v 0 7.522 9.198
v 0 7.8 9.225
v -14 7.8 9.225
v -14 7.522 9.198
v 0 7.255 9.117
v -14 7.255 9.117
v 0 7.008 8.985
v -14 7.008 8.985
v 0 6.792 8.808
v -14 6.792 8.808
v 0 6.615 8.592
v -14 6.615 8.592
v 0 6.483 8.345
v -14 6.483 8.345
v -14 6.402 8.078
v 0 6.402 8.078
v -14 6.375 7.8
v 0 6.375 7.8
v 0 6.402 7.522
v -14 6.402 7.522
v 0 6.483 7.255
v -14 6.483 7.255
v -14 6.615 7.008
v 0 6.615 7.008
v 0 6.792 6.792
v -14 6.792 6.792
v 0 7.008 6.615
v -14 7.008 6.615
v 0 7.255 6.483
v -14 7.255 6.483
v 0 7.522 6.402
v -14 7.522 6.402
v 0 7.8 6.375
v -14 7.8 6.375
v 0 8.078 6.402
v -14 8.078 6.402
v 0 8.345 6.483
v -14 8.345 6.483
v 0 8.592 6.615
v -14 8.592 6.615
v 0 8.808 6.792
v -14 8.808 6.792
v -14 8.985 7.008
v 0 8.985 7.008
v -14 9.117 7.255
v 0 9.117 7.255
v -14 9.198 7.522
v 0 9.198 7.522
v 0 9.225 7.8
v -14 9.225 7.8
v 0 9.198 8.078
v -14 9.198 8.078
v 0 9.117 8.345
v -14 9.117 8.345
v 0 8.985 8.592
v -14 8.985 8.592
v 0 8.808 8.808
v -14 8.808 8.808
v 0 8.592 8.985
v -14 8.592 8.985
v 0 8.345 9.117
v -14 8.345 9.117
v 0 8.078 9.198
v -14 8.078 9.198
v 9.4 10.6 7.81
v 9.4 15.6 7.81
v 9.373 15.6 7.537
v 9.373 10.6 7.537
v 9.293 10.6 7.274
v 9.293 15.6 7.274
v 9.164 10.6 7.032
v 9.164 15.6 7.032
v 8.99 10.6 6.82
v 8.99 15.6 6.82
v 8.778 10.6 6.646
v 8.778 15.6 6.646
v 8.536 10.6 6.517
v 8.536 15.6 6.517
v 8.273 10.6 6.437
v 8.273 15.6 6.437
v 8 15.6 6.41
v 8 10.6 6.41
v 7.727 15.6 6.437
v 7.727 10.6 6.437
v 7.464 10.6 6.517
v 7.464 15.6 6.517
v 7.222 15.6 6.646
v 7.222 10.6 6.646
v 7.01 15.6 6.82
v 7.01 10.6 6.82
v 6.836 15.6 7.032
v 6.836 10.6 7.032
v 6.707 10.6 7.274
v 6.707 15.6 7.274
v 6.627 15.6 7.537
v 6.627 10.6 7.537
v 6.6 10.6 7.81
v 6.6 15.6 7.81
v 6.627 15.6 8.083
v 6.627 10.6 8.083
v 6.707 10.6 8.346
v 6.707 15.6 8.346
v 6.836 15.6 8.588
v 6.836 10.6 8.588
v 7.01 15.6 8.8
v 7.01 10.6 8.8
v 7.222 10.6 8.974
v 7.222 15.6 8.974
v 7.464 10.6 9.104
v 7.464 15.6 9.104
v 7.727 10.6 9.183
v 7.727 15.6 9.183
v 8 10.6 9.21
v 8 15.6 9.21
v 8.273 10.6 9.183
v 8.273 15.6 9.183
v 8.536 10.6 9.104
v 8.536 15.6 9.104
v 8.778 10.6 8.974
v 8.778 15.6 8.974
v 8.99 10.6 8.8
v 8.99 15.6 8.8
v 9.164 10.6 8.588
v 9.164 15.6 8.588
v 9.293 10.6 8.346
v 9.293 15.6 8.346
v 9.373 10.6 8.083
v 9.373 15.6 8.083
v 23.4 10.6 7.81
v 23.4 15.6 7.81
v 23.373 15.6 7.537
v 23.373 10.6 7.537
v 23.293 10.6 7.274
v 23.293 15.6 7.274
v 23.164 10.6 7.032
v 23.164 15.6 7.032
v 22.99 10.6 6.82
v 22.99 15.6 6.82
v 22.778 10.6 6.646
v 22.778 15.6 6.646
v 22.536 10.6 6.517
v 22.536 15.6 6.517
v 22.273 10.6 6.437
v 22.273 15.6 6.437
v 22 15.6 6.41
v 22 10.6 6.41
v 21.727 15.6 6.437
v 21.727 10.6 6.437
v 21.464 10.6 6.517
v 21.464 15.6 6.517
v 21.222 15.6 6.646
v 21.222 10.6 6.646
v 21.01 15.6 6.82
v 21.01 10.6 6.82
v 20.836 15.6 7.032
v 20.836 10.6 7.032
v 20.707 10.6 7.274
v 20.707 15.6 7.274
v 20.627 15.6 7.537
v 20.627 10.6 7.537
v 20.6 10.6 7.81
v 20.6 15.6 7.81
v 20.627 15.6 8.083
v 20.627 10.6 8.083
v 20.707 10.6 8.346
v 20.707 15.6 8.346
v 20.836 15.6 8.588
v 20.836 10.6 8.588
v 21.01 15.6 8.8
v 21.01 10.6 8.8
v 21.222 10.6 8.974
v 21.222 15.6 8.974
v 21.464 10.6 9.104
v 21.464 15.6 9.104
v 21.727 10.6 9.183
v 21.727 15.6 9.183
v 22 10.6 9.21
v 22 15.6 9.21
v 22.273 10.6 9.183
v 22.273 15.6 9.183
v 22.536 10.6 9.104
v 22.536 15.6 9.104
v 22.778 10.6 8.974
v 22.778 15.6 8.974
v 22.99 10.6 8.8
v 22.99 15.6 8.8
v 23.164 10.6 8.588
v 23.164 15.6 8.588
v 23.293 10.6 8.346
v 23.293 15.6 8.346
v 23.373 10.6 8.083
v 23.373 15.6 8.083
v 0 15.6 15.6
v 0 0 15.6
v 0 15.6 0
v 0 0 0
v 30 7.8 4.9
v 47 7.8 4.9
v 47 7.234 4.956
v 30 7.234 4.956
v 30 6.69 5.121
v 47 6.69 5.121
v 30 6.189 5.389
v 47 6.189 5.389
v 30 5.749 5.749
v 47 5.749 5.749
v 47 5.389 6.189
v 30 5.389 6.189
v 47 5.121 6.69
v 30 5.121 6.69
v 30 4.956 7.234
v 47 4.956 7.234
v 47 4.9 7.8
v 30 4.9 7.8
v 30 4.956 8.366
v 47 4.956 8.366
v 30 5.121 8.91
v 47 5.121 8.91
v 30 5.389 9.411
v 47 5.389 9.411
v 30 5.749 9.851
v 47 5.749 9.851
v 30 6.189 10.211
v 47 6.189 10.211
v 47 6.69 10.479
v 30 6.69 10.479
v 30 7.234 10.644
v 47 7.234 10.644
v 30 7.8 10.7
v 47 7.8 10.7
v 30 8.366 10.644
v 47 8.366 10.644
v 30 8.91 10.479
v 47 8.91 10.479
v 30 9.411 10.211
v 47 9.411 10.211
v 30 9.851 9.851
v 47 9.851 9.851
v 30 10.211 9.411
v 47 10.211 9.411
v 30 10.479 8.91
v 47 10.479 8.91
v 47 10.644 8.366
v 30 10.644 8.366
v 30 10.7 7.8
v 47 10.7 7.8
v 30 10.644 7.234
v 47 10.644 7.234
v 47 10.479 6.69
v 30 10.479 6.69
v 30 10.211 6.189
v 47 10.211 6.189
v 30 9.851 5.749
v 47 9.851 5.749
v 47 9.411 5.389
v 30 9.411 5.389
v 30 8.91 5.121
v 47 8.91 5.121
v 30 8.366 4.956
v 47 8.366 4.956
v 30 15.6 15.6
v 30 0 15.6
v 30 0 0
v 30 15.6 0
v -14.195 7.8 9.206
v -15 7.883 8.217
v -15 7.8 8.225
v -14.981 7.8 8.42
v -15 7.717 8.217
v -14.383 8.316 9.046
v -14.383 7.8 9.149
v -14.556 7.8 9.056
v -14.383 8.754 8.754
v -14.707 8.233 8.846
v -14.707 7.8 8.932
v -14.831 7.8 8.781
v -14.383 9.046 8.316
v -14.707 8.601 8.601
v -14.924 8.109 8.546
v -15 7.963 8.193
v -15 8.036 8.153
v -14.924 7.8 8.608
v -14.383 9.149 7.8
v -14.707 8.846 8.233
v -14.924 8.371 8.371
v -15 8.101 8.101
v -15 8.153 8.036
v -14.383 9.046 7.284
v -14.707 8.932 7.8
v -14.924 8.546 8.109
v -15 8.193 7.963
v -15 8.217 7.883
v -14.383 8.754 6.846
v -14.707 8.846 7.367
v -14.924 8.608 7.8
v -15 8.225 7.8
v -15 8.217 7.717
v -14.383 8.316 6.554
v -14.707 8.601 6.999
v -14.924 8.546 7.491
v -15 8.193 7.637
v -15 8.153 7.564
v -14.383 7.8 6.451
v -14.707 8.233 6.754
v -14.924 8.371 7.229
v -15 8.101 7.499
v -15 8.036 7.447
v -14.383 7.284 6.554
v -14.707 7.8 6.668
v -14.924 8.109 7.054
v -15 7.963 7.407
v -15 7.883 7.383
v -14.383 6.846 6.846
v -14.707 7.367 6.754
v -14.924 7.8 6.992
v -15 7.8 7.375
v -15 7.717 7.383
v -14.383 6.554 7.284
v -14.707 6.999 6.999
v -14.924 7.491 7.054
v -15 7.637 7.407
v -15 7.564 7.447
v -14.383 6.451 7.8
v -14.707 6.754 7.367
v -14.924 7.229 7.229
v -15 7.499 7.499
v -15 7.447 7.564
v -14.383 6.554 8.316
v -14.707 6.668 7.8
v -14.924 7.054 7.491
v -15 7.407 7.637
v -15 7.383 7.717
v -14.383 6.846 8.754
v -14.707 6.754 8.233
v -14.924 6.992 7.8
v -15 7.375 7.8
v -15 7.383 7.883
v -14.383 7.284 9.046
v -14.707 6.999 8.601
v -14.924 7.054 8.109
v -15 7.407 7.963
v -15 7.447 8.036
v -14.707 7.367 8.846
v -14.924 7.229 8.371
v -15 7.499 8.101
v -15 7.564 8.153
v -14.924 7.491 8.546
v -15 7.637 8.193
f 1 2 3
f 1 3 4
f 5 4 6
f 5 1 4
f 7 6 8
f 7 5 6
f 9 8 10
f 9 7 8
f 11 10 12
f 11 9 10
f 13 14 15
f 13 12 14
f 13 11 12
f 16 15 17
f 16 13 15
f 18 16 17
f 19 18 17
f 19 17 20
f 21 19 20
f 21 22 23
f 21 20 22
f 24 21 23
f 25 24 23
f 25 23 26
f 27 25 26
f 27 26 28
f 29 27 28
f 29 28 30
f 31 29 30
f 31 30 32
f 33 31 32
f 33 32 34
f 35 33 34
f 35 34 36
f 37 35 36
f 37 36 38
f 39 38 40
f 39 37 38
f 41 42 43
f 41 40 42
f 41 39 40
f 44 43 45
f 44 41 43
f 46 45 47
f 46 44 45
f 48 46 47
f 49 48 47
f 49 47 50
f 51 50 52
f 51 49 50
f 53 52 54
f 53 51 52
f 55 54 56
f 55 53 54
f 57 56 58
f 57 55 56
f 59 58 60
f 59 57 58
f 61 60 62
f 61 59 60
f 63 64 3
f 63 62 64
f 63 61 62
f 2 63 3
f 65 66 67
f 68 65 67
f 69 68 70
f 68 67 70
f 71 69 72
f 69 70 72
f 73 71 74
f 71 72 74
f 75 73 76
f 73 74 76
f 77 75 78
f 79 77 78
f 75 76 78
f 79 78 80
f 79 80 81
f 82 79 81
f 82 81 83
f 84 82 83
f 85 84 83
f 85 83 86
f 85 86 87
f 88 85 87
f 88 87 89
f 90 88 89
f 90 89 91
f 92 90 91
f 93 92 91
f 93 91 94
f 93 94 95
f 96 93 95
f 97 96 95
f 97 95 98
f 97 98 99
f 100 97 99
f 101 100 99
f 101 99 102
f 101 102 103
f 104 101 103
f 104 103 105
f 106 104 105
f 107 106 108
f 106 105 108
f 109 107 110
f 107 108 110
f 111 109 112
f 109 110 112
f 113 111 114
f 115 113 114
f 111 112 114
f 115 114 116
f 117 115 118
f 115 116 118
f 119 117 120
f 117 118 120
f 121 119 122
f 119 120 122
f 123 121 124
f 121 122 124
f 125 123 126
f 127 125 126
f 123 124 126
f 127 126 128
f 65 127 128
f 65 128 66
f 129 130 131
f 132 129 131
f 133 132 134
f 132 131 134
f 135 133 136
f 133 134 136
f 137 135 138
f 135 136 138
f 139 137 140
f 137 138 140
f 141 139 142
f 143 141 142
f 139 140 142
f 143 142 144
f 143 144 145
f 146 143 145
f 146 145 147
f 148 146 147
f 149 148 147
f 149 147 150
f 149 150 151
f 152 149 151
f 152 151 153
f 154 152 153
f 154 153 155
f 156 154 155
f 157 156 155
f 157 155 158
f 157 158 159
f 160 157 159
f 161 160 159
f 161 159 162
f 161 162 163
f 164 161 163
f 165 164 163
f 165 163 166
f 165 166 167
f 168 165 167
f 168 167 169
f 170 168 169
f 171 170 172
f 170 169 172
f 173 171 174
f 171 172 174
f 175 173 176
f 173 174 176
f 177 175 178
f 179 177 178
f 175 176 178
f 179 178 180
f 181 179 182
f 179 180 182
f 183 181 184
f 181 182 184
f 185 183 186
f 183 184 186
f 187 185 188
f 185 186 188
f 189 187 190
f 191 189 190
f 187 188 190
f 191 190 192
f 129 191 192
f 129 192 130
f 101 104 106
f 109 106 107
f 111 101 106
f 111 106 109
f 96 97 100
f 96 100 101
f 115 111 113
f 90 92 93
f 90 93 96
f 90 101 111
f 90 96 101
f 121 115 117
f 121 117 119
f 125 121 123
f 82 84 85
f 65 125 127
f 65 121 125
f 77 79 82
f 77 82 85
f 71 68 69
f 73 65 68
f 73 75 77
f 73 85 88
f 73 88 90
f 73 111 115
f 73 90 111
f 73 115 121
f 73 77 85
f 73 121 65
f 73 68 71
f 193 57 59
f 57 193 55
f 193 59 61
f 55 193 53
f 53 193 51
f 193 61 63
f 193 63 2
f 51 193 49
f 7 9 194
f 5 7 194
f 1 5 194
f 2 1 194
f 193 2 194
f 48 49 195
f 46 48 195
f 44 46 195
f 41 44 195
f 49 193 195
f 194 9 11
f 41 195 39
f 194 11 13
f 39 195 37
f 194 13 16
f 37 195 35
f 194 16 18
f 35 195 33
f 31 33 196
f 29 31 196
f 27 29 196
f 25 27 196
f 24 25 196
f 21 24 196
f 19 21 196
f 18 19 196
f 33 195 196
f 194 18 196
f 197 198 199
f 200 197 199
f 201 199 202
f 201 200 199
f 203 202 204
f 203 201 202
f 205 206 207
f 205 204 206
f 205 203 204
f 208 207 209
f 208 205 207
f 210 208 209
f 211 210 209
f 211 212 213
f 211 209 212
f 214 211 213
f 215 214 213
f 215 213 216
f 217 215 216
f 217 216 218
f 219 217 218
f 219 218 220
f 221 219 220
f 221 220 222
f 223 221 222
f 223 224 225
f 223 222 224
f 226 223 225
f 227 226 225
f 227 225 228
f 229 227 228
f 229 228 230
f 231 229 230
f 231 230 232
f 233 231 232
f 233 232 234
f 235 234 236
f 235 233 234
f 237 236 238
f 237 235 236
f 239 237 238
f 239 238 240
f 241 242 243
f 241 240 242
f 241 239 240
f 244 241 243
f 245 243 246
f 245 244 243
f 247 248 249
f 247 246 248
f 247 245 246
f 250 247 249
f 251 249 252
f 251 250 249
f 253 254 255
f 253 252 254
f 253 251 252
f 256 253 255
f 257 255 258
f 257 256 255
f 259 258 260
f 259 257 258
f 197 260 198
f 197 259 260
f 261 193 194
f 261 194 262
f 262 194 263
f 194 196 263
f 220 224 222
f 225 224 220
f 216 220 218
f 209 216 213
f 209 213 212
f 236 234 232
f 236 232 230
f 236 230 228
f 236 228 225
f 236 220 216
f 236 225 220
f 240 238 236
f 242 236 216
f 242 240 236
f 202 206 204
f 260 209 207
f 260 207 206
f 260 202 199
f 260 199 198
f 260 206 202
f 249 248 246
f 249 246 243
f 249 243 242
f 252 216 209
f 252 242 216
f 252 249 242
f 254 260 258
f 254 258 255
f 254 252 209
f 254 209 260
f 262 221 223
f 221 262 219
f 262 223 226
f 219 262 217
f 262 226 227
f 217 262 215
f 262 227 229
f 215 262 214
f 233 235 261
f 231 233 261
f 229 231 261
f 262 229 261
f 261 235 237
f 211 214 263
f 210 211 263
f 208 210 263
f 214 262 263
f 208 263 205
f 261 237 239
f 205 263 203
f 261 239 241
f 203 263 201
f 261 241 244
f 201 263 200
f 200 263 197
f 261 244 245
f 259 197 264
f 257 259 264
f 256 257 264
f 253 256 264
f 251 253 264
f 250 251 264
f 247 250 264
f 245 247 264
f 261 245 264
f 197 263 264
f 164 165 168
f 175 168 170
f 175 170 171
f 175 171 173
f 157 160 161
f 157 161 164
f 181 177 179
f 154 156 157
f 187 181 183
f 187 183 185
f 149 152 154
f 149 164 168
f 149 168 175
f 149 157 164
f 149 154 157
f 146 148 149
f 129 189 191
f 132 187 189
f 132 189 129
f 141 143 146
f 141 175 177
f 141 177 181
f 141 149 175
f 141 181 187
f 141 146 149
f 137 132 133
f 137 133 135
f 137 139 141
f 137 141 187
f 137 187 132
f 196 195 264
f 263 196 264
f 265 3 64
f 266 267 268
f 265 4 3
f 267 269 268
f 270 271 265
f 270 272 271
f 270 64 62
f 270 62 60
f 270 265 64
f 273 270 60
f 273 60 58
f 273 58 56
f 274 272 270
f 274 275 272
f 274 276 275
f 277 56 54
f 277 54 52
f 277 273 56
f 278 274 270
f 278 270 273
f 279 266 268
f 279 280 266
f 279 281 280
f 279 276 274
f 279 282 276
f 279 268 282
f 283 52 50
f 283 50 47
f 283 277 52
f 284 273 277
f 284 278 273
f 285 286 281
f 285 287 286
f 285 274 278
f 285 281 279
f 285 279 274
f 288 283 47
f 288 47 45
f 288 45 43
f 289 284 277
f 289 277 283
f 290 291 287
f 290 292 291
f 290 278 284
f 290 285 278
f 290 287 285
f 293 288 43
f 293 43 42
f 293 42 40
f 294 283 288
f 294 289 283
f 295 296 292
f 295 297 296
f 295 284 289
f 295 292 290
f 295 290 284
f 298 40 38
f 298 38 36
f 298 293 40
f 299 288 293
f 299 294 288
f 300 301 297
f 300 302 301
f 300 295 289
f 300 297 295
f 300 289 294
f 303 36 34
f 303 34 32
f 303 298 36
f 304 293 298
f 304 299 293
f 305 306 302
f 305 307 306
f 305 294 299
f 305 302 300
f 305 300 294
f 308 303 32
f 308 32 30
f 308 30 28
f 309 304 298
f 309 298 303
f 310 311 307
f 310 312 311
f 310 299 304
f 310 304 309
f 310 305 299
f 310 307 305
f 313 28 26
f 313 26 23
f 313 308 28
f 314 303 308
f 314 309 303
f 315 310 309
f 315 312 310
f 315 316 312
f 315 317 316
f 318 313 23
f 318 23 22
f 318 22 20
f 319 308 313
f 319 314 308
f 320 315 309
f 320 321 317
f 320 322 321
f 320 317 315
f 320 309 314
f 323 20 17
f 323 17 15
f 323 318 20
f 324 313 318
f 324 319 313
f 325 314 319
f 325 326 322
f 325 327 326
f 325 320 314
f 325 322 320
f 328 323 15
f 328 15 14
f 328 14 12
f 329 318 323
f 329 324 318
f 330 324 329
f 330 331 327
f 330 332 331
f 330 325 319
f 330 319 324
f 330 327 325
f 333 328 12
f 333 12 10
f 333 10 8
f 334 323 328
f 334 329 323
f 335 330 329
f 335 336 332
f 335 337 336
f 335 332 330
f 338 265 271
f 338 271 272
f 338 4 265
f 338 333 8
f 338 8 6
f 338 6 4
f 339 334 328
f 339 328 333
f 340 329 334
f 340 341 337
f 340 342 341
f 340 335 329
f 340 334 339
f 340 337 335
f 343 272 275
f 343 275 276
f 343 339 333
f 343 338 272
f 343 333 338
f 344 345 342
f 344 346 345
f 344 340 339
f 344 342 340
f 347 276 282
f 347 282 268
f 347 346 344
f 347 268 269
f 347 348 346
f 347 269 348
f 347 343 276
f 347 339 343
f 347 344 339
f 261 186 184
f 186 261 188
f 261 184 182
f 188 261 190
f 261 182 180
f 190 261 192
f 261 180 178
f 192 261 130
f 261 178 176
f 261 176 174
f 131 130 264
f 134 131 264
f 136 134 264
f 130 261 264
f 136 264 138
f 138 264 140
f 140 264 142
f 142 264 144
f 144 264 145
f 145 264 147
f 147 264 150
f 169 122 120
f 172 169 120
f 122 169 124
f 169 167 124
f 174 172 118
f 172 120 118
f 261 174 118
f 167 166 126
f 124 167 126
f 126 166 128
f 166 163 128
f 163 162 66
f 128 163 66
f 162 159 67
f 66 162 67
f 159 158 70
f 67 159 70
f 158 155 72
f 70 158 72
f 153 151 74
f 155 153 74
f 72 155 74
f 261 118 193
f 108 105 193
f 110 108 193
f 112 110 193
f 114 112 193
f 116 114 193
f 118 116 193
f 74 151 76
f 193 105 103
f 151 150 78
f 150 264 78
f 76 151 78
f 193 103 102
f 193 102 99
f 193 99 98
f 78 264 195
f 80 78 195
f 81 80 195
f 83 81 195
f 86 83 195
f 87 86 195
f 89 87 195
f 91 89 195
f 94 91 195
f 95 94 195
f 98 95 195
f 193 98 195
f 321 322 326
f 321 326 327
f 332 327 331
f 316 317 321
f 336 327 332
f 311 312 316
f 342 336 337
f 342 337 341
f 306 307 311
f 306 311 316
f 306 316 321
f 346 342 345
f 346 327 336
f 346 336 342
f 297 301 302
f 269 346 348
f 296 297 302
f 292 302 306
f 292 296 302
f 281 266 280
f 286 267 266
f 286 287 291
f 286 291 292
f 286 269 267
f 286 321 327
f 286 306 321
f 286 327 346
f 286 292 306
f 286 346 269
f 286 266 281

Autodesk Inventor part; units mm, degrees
ref_plane "YZ Plane" through (0, 0, 0) normal (1, 0, 0) x (0, 1, 0)
ref_plane "XZ Plane" through (0, 0, 0) normal (0, 1, 0) x (-1, 0, 0)
ref_plane "XY Plane" through (0, 0, 0) normal (0, 0, 1) x (1, 0, 0)
sketch "Sketch1" plane through (0, 0, 0) normal (0, 0, 1) x (1, 0, 0)
  line L0 (0, 0) -> (30, 0)
  line L1 (30, 0) -> (30, 15.6)
  line L2 (30, 15.6) -> (0, 15.6)
  line L3 (0, 15.6) -> (0, 0)
  dimension "d0" = 30
  dimension "d1" = 15.6
extrude "Extrusion1" add sketch "Sketch1" along normal blind 15.6
sketch "Sketch2" plane through (30, 0, 0) normal (1, 0, 0) x (0, 0, -1)
  line L0 (0, 0) -> (0, 15.6) projected
  line L1 (0, 15.6) -> (-15.6, 15.6) projected
  line L2 (-15.6, 0) -> (-15.6, 15.6) projected
  line L3 (0, 0) -> (-15.6, 0) projected
  circle A0 centre (-7.8, 7.8) radius 2.9
  dimension "d4" = 5.8
extrude "Extrusion2" add sketch "Sketch2" along normal blind 17 contours A0
sketch "Sketch3" plane through (0, 0, 0) normal (-1, 0, 0) x (0, 0, 1)
  circle A0 centre (7.8, 7.8) radius 2.9 projected
  circle A1 centre (7.8, 7.8) radius 1.425
  point P0 (0, 0)
  dimension "d7" = 2.85
extrude "Extrusion3" add sketch "Sketch3" along normal blind 15 contours A1
fillet "Fillet1" radius 1 1 edges at (-15, 7.8, 6.375)
sketch "Sketch4" plane through (0, 15.6, 0) normal (0, 1, 0) x (1, 0, 0)
  circle A0 centre (8, -7.8101) radius 1.4
  circle A1 centre (22, -7.8101) radius 1.4
  line L0 (30, 0) -> (30, -15.6) projected
  line L1 (0, 0) -> (0, -15.6) projected
  dimension "d11" = 2.8
  dimension "d12" = 2.8
  dimension "d13" = 8
  dimension "d14" = 8
extrude "Extrusion4" cut sketch "Sketch4" against normal blind 5
properties part number "00_JF-0530B-solenoid"
